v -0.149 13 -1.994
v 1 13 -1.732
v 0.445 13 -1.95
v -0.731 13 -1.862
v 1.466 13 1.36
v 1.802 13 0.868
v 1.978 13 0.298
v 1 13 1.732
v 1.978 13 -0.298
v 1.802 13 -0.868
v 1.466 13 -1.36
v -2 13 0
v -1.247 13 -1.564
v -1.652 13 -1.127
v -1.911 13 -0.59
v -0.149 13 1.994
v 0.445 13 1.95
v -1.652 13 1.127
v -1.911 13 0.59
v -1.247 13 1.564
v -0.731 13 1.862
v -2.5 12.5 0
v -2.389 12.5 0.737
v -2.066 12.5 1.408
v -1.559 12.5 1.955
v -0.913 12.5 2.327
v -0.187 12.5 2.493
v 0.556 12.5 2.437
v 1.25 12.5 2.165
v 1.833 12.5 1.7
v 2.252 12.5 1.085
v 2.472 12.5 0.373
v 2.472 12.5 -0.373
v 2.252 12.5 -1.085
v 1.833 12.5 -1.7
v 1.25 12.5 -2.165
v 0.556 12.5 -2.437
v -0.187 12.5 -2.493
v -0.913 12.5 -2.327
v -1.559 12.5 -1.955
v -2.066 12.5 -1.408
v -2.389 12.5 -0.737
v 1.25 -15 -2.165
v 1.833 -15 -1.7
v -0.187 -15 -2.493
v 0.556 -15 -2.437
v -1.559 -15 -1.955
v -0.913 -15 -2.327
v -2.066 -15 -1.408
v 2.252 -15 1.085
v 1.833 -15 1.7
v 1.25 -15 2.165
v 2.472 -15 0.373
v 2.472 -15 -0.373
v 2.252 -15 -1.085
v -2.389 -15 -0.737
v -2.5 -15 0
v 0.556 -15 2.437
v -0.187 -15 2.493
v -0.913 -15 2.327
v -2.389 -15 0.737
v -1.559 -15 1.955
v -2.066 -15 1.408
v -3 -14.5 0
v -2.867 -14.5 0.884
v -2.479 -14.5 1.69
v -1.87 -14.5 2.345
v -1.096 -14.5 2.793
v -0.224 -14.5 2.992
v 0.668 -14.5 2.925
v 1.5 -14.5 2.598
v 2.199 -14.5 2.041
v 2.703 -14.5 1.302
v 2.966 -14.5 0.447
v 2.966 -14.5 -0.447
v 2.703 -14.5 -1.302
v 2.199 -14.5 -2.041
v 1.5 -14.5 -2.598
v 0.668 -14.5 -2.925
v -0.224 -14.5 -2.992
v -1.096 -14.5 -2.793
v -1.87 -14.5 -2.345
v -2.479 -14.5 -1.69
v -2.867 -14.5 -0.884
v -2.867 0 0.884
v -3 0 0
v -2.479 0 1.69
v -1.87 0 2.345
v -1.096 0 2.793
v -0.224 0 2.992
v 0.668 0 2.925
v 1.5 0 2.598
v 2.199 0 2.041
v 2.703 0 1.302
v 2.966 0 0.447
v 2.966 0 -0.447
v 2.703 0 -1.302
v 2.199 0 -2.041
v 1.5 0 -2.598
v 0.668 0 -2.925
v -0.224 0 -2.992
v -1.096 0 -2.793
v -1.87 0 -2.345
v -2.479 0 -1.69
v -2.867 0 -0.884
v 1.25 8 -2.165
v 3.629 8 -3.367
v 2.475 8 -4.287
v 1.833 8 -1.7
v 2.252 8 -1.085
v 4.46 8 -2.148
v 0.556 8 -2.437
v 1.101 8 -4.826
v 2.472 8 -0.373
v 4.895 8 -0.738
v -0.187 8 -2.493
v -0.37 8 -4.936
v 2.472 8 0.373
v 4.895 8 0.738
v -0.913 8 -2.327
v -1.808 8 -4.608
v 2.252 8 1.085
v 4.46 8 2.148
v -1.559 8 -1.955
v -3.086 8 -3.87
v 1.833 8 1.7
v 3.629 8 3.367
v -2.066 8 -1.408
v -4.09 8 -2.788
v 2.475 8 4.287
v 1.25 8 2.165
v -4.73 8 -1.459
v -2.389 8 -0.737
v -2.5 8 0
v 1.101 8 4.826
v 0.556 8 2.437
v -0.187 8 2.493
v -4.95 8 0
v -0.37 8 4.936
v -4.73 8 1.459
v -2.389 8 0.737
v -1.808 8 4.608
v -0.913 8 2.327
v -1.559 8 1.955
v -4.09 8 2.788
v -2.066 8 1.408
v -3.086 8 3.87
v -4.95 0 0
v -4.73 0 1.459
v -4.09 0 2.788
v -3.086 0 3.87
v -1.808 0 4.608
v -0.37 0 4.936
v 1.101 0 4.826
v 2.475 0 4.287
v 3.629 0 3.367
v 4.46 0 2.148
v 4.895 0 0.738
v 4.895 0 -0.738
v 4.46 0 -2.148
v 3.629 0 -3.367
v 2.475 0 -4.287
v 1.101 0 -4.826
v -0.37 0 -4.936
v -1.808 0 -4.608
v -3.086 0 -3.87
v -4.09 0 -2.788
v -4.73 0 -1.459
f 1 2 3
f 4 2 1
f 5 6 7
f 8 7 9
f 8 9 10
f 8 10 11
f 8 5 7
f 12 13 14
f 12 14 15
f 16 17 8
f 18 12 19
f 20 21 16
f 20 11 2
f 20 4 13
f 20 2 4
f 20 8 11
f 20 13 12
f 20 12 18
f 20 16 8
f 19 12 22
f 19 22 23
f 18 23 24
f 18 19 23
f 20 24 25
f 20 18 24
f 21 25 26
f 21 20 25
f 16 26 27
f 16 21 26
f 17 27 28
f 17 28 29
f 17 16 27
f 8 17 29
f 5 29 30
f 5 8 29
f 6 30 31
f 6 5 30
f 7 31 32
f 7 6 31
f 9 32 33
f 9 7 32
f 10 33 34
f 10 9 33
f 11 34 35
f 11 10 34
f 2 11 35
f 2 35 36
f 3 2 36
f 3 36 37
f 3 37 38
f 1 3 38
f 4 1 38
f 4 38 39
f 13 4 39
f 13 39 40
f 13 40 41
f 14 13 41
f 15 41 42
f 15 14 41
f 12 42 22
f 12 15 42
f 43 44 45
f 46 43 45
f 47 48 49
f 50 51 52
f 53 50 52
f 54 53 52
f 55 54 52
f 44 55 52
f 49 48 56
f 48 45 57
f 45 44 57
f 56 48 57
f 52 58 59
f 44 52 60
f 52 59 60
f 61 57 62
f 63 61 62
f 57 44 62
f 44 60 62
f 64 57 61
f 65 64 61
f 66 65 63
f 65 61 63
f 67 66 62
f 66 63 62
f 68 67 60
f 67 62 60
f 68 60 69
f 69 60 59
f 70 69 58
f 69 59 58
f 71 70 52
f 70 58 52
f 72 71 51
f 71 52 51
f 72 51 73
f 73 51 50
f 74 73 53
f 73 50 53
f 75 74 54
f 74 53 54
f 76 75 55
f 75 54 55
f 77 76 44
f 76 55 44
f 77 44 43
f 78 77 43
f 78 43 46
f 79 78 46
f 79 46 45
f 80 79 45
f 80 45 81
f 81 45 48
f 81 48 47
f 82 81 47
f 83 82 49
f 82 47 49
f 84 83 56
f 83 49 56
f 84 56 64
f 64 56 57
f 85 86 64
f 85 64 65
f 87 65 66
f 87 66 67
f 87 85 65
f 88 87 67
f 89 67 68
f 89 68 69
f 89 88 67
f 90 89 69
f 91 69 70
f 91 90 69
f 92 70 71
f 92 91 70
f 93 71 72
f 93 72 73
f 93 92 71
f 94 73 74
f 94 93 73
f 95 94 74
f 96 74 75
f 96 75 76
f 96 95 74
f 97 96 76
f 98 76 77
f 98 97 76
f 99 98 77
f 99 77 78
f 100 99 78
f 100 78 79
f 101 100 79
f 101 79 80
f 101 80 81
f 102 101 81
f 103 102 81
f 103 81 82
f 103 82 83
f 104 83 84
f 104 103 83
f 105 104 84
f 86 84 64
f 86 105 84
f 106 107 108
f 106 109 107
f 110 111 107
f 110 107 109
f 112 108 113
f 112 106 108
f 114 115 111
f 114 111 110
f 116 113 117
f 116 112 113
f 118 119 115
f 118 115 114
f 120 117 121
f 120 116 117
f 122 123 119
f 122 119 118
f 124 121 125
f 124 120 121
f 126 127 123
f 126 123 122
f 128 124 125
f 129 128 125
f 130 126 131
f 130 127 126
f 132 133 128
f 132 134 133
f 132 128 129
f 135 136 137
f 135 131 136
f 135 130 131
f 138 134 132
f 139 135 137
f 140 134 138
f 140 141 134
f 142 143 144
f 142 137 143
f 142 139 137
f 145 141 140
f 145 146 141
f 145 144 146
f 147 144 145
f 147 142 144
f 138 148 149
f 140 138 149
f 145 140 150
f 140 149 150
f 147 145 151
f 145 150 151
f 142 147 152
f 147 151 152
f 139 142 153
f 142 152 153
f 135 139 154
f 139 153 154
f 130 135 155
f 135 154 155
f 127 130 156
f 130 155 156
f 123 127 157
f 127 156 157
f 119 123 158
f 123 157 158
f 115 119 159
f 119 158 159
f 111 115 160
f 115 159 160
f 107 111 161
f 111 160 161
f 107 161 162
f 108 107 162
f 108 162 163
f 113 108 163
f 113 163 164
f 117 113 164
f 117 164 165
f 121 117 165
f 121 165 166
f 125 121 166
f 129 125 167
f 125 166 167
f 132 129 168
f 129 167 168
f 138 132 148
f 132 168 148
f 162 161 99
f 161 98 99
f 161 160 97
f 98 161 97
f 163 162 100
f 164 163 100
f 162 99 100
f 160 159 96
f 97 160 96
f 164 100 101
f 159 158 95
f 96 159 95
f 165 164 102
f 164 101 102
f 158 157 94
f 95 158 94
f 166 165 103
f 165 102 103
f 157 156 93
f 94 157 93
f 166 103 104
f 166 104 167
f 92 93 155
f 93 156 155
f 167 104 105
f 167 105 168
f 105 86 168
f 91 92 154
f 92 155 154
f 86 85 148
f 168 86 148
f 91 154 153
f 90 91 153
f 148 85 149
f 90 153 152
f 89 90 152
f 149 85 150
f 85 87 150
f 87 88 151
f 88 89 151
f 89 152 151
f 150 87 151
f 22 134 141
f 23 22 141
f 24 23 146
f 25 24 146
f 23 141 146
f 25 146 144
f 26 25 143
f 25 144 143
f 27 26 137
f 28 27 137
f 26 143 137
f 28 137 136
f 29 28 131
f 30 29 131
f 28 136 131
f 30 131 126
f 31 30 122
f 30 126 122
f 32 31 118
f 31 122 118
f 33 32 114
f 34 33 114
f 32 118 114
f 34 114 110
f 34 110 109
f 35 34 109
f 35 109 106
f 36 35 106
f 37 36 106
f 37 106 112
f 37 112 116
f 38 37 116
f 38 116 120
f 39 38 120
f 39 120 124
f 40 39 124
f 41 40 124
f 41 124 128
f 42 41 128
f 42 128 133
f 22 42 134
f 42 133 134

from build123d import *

# Parameters (mm, degrees)
SCHIZZO1_R                   = 3
ESTRUSIONE_ESTRUSIONE1_DEPTH = 15
SCHIZZO2_R                   = 4.95
ESTRUSIONE_ESTRUSIONE2_DEPTH = 8
SMUSSO1_SIZE                 = 0.5
SCHIZZO4_R                   = 2.5
ESTRUSIONE_ESTRUSIONE5_DEPTH = 5
SMUSSO2_SIZE                 = 0.5


with BuildPart() as part:
    # Schizzo1 → Estrusione-Estrusione1 (new body)
    with BuildSketch(Plane(origin=(0, 0, 0), x_dir=(1, 0, 0), z_dir=(0, 1, 0))):
        with Locations(Location((0, 0, 0), (0, 0, 180))):
            Circle(SCHIZZO1_R)
    extrude(amount=-ESTRUSIONE_ESTRUSIONE1_DEPTH)

    # Schizzo2 → Estrusione-Estrusione2 (add)
    with BuildSketch(Plane(origin=(0, 0, 0), x_dir=(1, 0, 0), z_dir=(0, 1, 0))):
        with Locations(Location((0, 0, 0), (0, 0, 180))):
            Circle(SCHIZZO2_R)
    extrude(amount=ESTRUSIONE_ESTRUSIONE2_DEPTH)

    # Smusso1
    smusso1_edges = [part.edges().sort_by_distance(p)[0] for p in [
        (3, -15, 0),
    ]]
    chamfer(smusso1_edges, length=SMUSSO1_SIZE)

    # Schizzo4 → Estrusione-Estrusione5 (add)
    with BuildSketch(Plane(origin=(0, 8, 0), x_dir=(1, 0, 0), z_dir=(0, 1, 0))):
        with Locations(Location((0, 0, 0), (0, 0, 180))):
            Circle(SCHIZZO4_R)
    extrude(amount=ESTRUSIONE_ESTRUSIONE5_DEPTH)

    # Smusso2
    smusso2_edges = [part.edges().sort_by_distance(p)[0] for p in [
        (2.5, 13, 0),
    ]]
    chamfer(smusso2_edges, length=SMUSSO2_SIZE)


solid = part.part
